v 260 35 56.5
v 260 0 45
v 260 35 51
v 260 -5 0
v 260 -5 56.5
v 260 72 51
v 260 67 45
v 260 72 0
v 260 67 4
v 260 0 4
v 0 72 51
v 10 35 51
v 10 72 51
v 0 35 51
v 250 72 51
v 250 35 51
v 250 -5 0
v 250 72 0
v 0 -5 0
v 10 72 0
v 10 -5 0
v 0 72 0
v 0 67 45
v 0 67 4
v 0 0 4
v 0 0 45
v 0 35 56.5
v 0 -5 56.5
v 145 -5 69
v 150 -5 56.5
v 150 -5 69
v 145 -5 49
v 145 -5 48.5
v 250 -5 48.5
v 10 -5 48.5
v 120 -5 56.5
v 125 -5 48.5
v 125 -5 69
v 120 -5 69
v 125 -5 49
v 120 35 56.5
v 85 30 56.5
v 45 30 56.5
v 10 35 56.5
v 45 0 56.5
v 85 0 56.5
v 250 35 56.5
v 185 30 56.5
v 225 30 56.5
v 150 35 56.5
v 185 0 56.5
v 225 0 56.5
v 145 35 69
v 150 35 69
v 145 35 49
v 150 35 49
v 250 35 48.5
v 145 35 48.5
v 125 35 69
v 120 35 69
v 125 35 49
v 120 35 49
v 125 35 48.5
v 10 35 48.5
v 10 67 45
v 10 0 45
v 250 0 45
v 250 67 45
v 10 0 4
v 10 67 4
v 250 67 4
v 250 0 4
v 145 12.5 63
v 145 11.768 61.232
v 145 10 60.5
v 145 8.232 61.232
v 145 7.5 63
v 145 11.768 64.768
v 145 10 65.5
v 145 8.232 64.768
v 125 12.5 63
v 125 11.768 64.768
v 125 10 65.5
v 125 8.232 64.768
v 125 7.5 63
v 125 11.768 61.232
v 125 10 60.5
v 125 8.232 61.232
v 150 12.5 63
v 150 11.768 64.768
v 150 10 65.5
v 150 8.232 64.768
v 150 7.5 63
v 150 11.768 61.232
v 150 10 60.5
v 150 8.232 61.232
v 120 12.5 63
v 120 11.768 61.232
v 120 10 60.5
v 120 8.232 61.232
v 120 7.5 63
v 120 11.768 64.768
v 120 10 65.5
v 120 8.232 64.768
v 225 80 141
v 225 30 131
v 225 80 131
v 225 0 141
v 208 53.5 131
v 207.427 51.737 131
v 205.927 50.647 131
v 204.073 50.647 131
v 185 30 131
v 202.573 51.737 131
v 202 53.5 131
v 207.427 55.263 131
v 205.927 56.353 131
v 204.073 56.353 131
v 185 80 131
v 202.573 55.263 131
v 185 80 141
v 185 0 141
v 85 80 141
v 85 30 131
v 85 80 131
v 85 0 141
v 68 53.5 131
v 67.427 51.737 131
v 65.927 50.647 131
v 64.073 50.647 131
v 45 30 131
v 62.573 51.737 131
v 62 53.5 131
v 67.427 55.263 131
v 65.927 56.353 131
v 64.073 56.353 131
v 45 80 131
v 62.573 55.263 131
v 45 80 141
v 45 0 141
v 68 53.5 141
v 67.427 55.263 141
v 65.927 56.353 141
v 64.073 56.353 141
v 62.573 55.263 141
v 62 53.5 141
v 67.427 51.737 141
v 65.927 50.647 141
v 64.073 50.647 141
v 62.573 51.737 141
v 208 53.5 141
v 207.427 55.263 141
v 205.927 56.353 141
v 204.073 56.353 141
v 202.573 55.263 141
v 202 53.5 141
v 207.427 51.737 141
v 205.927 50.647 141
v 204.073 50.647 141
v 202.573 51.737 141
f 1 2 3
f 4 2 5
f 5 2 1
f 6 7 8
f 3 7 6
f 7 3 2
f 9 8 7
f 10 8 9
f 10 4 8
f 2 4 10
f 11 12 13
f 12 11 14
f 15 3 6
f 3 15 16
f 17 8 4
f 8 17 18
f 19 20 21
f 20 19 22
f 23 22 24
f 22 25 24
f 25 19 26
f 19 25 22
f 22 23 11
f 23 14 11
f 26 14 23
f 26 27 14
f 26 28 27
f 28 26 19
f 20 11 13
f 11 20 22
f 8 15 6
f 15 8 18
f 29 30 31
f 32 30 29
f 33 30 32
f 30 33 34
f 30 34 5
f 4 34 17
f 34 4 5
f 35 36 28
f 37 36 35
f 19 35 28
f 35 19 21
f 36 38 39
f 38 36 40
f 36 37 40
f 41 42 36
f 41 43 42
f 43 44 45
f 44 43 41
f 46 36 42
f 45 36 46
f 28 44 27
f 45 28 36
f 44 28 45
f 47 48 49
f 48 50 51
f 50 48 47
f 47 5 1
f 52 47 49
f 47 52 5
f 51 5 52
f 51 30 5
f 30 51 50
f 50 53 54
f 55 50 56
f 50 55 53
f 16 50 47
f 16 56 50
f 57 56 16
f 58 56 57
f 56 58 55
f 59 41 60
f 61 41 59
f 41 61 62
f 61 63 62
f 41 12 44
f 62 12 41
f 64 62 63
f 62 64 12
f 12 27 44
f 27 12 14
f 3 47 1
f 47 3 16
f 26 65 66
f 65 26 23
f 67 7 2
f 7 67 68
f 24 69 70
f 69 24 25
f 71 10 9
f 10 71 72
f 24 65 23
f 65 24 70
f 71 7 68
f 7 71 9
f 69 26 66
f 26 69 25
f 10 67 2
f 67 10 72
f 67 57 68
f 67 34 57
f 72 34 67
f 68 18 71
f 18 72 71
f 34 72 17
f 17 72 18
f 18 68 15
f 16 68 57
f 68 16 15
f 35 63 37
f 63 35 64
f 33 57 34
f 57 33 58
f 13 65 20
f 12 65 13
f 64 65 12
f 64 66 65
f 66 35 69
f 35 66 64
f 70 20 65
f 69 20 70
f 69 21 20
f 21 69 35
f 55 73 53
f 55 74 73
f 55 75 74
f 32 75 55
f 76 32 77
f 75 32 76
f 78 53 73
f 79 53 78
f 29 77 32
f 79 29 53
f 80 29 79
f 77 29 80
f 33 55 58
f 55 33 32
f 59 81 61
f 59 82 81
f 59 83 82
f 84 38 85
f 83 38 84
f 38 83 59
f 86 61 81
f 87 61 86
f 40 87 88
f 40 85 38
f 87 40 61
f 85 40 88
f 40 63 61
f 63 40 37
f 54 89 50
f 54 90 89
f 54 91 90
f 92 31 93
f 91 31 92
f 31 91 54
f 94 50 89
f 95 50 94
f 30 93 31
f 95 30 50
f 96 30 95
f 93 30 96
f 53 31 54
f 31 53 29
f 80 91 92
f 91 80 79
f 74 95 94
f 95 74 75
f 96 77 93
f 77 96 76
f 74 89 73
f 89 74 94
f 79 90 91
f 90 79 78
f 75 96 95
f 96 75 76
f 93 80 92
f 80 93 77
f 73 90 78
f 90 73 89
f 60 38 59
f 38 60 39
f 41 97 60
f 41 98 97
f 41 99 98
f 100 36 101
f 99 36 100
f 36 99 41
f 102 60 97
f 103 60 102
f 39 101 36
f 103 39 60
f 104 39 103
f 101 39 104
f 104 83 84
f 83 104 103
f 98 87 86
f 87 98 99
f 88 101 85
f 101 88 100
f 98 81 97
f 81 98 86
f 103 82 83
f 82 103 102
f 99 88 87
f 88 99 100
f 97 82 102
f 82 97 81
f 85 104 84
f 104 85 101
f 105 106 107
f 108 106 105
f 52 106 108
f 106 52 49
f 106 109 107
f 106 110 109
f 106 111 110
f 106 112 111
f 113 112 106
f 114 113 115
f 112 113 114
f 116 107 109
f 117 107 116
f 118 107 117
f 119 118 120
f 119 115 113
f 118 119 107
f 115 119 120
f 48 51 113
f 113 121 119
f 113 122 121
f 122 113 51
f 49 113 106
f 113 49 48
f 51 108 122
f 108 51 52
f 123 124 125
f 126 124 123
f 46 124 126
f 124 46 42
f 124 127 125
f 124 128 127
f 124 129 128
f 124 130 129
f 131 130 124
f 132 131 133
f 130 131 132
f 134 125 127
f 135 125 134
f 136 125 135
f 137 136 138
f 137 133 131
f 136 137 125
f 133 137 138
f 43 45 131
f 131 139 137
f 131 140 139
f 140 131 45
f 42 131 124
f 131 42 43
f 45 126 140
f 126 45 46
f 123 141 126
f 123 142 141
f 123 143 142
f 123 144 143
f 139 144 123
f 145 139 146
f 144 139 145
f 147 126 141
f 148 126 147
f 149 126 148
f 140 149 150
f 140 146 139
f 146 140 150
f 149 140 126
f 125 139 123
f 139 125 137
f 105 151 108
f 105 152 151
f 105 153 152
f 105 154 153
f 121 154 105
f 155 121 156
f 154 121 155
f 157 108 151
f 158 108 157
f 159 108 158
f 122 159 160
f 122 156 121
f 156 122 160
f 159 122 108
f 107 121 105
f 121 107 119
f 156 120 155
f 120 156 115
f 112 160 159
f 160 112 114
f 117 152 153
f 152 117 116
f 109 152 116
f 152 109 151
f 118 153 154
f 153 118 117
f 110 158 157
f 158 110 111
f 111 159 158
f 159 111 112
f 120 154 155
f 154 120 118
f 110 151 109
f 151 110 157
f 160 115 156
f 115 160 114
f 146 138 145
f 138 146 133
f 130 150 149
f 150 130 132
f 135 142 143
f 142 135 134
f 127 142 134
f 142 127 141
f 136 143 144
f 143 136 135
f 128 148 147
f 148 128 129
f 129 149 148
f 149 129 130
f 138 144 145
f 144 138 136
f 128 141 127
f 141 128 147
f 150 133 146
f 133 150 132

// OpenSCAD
//kinectV2LaylaBracket.scad
//10-27-18

//milimeters = units 
//25cm long, 4.1cm high, 6.7cm deep 
kinectWidth = 250;  
kinectHeight = 41; 
kinectDepth = 67; 

difference(){
    //Outward layer
    //add cm thickness 
    width = 10; 
    bottomLayer = 4; 
    
    union(){
        translate([0, -width/2, 0]) 
            cube([kinectWidth + width, kinectDepth + width, kinectHeight + width]);
        
        //give more layers to backing on top for support 
        translate([0, -width/2,kinectHeight/2 ]) 
            cube([kinectWidth + width, 40,  kinectHeight - width/2]);
    }
    
    //Inside (kinect) 
    translate([-kinectWidth/2, 0, width/2 - (width/2 - bottomLayer)]) 
        cube([kinectWidth *2, kinectDepth,  kinectHeight]); //width, height, depth ? But wid,hei looks swapped   
    
    //take out walls
    translate([width,-kinectHeight/2,-kinectDepth/2 ]) 
        cube([kinectWidth - width, kinectDepth *2,  kinectHeight*2]);
   
    //take out front part so we have a connector on the top back 
    translate([width,35,-kinectDepth/2 +10 ]) 
        cube([kinectWidth - width, kinectDepth *2,  kinectHeight*2]);    
    
    //split the halves 
    translate([kinectWidth/2,-kinectDepth/2,-kinectDepth/2 +10 ]) 
        cube([width*2, kinectDepth *2,  kinectHeight*2]);   
    
     
}
width = 10; 

difference(){
 //add connectors for halves
    translate([kinectWidth/2 + width*2,-width/2,kinectHeight + width -2 ]) 
        cube([width/2, 40 ,  width*2]);  

screwDiameter = 2.5; 
translate([kinectWidth/2 +width,width,kinectHeight + width*2 + 2 ]) 
    rotate([0, 90, 0])
        cylinder(width*4, screwDiameter, screwDiameter, true); 
}

difference(){
    translate([kinectWidth/2 -width/2,-width/2,kinectHeight + width -2 ]) 
        cube([width/2, 40 ,  width*2]); 
    
    screwDiameter = 2.5; 
translate([kinectWidth/2 +width,width,kinectHeight + width*2 + 2 ]) 
    rotate([0, 90, 0])
        cylinder(width*4, screwDiameter, screwDiameter, true); 
}

//The top latches



difference(){
union(){
translate([kinectWidth/2 +width*6,0,kinectHeight + width ]) 
    cube([40, 30, 80]); 

translate([kinectWidth/2 -width*8,0,kinectHeight + width ]) 
    cube([40, 30, 80]); 
translate([kinectWidth/2 -width*8,0,kinectHeight + width + 80 ]) 
    cube([40, 80, 10]); 

translate([kinectWidth/2 +width*6,0,kinectHeight + width + 80 ]) 
    cube([40, 80, 10]); 
}
//bevel
/*
translate([50 + kinectWidth/2 + width*2, width*4 + -5, width*12 + 4])
    rotate([0, 90, 0])
        cylinder(50, 10, 10, true); 
*/ 

//screw holes on top 
translate([kinectWidth/2 +width*8,kinectDepth/2 + width*2,kinectHeight + width + 80 ]) 
    cylinder(40, 3, 3, true); 

//screw holes on top 
translate([kinectWidth/2 -width*6,kinectDepth/2 + width*2,kinectHeight + width + 80 ]) 
    cylinder(40, 3, 3, true); 
}
